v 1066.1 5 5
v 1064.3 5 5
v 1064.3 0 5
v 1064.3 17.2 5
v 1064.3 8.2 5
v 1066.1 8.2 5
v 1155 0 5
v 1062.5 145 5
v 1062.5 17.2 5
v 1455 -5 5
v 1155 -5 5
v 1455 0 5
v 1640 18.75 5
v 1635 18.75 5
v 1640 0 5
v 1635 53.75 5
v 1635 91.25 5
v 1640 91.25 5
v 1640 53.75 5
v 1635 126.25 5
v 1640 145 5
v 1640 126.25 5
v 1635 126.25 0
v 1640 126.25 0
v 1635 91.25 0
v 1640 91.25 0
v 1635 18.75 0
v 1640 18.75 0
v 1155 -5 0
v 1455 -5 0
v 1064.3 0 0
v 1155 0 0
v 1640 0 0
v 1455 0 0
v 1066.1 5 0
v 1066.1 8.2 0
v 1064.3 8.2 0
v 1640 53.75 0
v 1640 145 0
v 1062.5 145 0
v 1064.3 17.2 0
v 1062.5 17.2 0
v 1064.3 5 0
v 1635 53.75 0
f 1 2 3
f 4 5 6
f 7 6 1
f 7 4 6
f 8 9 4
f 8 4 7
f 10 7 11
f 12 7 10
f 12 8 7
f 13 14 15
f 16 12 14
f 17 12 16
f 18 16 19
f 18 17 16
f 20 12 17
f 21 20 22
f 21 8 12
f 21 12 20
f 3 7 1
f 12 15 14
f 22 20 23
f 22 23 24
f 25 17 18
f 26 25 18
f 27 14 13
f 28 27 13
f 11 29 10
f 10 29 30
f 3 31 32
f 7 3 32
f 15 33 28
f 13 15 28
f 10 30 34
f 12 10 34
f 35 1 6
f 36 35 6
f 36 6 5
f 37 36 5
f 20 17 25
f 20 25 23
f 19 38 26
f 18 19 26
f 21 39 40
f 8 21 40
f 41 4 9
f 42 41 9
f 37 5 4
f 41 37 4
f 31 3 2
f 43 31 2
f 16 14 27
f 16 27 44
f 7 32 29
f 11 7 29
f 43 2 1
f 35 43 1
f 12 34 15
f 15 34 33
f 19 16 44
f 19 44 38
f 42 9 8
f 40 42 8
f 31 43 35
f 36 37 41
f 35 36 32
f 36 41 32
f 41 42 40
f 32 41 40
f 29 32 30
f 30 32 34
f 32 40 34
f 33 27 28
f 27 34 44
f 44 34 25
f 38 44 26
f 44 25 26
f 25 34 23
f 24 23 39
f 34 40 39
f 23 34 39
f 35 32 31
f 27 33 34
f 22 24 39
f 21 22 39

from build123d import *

# Parameters (mm, degrees)
SALIENTE_EXTRUIR1_DEPTH = 5
CROQUIS2_W              = 5
CROQUIS2_H              = 35
CORTAR_EXTRUIR1_DEPTH   = 5
CORTAR_EXTRUIR2_DEPTH   = 10
CORTAR_EXTRUIR5_DEPTH   = 10


with BuildPart() as part:
    # Croquis1 → Saliente-Extruir1 (new body)
    with BuildSketch(Plane.XY):
        Polygon((0, 145), (0, 0), (183.734642654, 0), (185, 0), (185, -5), (485, -5), (485, 0), (670, 0), (670, -5), (970, -5), (970, 0), (1155, 0), (1155, -5), (1455, -5), (1455, 0), (1640, 0), (1640, 145), align=None)
    extrude(amount=SALIENTE_EXTRUIR1_DEPTH)

    # Croquis2 → Cortar-Extruir1 (cut)
    with BuildSketch(Plane.XY.offset(5)):
        with Locations((1637.5, 108.75)):
            Rectangle(CROQUIS2_W, CROQUIS2_H)
        with Locations((1637.5, 36.25)):
            Rectangle(CROQUIS2_W, CROQUIS2_H)
        with Locations((2.5, 36.25)):
            Rectangle(CROQUIS2_W, CROQUIS2_H)
        with Locations((2.5, 108.75)):
            Rectangle(CROQUIS2_W, CROQUIS2_H)
    extrude(amount=-CORTAR_EXTRUIR1_DEPTH, mode=Mode.SUBTRACT)

    # Croquis3 → Cortar-Extruir2 (cut)
    with BuildSketch(Plane.XY.offset(5)):
        Polygon((579.3, 0), (575.7, 0), (575.7, 5), (573.9, 5), (573.9, 8.2), (575.7, 8.2), (575.7, 17.2), (579.3, 17.2), (579.3, 8.2), (581.1, 8.2), (581.1, 5), (579.3, 5), align=None)
        Polygon((1064.3, 8.2), (1064.3, 17.2), (1060.7, 17.2), (1060.7, 8.2), (1058.9, 8.2), (1058.9, 5), (1060.7, 5), (1060.7, 0), (1064.3, 0), (1064.3, 5), (1066.1, 5), (1066.1, 8.2), align=None)
    extrude(amount=-CORTAR_EXTRUIR2_DEPTH, mode=Mode.SUBTRACT)

    # Croquis4 → Cortar-Extruir5 (cut)
    with BuildSketch(Plane.XY.offset(5)):
        Polygon((1062.5, 17.2), (1062.5, 145), (0, 145), (0, -10.556117746), (1062.5, -10.556117746), align=None)
    extrude(amount=-CORTAR_EXTRUIR5_DEPTH, mode=Mode.SUBTRACT)


solid = part.part
